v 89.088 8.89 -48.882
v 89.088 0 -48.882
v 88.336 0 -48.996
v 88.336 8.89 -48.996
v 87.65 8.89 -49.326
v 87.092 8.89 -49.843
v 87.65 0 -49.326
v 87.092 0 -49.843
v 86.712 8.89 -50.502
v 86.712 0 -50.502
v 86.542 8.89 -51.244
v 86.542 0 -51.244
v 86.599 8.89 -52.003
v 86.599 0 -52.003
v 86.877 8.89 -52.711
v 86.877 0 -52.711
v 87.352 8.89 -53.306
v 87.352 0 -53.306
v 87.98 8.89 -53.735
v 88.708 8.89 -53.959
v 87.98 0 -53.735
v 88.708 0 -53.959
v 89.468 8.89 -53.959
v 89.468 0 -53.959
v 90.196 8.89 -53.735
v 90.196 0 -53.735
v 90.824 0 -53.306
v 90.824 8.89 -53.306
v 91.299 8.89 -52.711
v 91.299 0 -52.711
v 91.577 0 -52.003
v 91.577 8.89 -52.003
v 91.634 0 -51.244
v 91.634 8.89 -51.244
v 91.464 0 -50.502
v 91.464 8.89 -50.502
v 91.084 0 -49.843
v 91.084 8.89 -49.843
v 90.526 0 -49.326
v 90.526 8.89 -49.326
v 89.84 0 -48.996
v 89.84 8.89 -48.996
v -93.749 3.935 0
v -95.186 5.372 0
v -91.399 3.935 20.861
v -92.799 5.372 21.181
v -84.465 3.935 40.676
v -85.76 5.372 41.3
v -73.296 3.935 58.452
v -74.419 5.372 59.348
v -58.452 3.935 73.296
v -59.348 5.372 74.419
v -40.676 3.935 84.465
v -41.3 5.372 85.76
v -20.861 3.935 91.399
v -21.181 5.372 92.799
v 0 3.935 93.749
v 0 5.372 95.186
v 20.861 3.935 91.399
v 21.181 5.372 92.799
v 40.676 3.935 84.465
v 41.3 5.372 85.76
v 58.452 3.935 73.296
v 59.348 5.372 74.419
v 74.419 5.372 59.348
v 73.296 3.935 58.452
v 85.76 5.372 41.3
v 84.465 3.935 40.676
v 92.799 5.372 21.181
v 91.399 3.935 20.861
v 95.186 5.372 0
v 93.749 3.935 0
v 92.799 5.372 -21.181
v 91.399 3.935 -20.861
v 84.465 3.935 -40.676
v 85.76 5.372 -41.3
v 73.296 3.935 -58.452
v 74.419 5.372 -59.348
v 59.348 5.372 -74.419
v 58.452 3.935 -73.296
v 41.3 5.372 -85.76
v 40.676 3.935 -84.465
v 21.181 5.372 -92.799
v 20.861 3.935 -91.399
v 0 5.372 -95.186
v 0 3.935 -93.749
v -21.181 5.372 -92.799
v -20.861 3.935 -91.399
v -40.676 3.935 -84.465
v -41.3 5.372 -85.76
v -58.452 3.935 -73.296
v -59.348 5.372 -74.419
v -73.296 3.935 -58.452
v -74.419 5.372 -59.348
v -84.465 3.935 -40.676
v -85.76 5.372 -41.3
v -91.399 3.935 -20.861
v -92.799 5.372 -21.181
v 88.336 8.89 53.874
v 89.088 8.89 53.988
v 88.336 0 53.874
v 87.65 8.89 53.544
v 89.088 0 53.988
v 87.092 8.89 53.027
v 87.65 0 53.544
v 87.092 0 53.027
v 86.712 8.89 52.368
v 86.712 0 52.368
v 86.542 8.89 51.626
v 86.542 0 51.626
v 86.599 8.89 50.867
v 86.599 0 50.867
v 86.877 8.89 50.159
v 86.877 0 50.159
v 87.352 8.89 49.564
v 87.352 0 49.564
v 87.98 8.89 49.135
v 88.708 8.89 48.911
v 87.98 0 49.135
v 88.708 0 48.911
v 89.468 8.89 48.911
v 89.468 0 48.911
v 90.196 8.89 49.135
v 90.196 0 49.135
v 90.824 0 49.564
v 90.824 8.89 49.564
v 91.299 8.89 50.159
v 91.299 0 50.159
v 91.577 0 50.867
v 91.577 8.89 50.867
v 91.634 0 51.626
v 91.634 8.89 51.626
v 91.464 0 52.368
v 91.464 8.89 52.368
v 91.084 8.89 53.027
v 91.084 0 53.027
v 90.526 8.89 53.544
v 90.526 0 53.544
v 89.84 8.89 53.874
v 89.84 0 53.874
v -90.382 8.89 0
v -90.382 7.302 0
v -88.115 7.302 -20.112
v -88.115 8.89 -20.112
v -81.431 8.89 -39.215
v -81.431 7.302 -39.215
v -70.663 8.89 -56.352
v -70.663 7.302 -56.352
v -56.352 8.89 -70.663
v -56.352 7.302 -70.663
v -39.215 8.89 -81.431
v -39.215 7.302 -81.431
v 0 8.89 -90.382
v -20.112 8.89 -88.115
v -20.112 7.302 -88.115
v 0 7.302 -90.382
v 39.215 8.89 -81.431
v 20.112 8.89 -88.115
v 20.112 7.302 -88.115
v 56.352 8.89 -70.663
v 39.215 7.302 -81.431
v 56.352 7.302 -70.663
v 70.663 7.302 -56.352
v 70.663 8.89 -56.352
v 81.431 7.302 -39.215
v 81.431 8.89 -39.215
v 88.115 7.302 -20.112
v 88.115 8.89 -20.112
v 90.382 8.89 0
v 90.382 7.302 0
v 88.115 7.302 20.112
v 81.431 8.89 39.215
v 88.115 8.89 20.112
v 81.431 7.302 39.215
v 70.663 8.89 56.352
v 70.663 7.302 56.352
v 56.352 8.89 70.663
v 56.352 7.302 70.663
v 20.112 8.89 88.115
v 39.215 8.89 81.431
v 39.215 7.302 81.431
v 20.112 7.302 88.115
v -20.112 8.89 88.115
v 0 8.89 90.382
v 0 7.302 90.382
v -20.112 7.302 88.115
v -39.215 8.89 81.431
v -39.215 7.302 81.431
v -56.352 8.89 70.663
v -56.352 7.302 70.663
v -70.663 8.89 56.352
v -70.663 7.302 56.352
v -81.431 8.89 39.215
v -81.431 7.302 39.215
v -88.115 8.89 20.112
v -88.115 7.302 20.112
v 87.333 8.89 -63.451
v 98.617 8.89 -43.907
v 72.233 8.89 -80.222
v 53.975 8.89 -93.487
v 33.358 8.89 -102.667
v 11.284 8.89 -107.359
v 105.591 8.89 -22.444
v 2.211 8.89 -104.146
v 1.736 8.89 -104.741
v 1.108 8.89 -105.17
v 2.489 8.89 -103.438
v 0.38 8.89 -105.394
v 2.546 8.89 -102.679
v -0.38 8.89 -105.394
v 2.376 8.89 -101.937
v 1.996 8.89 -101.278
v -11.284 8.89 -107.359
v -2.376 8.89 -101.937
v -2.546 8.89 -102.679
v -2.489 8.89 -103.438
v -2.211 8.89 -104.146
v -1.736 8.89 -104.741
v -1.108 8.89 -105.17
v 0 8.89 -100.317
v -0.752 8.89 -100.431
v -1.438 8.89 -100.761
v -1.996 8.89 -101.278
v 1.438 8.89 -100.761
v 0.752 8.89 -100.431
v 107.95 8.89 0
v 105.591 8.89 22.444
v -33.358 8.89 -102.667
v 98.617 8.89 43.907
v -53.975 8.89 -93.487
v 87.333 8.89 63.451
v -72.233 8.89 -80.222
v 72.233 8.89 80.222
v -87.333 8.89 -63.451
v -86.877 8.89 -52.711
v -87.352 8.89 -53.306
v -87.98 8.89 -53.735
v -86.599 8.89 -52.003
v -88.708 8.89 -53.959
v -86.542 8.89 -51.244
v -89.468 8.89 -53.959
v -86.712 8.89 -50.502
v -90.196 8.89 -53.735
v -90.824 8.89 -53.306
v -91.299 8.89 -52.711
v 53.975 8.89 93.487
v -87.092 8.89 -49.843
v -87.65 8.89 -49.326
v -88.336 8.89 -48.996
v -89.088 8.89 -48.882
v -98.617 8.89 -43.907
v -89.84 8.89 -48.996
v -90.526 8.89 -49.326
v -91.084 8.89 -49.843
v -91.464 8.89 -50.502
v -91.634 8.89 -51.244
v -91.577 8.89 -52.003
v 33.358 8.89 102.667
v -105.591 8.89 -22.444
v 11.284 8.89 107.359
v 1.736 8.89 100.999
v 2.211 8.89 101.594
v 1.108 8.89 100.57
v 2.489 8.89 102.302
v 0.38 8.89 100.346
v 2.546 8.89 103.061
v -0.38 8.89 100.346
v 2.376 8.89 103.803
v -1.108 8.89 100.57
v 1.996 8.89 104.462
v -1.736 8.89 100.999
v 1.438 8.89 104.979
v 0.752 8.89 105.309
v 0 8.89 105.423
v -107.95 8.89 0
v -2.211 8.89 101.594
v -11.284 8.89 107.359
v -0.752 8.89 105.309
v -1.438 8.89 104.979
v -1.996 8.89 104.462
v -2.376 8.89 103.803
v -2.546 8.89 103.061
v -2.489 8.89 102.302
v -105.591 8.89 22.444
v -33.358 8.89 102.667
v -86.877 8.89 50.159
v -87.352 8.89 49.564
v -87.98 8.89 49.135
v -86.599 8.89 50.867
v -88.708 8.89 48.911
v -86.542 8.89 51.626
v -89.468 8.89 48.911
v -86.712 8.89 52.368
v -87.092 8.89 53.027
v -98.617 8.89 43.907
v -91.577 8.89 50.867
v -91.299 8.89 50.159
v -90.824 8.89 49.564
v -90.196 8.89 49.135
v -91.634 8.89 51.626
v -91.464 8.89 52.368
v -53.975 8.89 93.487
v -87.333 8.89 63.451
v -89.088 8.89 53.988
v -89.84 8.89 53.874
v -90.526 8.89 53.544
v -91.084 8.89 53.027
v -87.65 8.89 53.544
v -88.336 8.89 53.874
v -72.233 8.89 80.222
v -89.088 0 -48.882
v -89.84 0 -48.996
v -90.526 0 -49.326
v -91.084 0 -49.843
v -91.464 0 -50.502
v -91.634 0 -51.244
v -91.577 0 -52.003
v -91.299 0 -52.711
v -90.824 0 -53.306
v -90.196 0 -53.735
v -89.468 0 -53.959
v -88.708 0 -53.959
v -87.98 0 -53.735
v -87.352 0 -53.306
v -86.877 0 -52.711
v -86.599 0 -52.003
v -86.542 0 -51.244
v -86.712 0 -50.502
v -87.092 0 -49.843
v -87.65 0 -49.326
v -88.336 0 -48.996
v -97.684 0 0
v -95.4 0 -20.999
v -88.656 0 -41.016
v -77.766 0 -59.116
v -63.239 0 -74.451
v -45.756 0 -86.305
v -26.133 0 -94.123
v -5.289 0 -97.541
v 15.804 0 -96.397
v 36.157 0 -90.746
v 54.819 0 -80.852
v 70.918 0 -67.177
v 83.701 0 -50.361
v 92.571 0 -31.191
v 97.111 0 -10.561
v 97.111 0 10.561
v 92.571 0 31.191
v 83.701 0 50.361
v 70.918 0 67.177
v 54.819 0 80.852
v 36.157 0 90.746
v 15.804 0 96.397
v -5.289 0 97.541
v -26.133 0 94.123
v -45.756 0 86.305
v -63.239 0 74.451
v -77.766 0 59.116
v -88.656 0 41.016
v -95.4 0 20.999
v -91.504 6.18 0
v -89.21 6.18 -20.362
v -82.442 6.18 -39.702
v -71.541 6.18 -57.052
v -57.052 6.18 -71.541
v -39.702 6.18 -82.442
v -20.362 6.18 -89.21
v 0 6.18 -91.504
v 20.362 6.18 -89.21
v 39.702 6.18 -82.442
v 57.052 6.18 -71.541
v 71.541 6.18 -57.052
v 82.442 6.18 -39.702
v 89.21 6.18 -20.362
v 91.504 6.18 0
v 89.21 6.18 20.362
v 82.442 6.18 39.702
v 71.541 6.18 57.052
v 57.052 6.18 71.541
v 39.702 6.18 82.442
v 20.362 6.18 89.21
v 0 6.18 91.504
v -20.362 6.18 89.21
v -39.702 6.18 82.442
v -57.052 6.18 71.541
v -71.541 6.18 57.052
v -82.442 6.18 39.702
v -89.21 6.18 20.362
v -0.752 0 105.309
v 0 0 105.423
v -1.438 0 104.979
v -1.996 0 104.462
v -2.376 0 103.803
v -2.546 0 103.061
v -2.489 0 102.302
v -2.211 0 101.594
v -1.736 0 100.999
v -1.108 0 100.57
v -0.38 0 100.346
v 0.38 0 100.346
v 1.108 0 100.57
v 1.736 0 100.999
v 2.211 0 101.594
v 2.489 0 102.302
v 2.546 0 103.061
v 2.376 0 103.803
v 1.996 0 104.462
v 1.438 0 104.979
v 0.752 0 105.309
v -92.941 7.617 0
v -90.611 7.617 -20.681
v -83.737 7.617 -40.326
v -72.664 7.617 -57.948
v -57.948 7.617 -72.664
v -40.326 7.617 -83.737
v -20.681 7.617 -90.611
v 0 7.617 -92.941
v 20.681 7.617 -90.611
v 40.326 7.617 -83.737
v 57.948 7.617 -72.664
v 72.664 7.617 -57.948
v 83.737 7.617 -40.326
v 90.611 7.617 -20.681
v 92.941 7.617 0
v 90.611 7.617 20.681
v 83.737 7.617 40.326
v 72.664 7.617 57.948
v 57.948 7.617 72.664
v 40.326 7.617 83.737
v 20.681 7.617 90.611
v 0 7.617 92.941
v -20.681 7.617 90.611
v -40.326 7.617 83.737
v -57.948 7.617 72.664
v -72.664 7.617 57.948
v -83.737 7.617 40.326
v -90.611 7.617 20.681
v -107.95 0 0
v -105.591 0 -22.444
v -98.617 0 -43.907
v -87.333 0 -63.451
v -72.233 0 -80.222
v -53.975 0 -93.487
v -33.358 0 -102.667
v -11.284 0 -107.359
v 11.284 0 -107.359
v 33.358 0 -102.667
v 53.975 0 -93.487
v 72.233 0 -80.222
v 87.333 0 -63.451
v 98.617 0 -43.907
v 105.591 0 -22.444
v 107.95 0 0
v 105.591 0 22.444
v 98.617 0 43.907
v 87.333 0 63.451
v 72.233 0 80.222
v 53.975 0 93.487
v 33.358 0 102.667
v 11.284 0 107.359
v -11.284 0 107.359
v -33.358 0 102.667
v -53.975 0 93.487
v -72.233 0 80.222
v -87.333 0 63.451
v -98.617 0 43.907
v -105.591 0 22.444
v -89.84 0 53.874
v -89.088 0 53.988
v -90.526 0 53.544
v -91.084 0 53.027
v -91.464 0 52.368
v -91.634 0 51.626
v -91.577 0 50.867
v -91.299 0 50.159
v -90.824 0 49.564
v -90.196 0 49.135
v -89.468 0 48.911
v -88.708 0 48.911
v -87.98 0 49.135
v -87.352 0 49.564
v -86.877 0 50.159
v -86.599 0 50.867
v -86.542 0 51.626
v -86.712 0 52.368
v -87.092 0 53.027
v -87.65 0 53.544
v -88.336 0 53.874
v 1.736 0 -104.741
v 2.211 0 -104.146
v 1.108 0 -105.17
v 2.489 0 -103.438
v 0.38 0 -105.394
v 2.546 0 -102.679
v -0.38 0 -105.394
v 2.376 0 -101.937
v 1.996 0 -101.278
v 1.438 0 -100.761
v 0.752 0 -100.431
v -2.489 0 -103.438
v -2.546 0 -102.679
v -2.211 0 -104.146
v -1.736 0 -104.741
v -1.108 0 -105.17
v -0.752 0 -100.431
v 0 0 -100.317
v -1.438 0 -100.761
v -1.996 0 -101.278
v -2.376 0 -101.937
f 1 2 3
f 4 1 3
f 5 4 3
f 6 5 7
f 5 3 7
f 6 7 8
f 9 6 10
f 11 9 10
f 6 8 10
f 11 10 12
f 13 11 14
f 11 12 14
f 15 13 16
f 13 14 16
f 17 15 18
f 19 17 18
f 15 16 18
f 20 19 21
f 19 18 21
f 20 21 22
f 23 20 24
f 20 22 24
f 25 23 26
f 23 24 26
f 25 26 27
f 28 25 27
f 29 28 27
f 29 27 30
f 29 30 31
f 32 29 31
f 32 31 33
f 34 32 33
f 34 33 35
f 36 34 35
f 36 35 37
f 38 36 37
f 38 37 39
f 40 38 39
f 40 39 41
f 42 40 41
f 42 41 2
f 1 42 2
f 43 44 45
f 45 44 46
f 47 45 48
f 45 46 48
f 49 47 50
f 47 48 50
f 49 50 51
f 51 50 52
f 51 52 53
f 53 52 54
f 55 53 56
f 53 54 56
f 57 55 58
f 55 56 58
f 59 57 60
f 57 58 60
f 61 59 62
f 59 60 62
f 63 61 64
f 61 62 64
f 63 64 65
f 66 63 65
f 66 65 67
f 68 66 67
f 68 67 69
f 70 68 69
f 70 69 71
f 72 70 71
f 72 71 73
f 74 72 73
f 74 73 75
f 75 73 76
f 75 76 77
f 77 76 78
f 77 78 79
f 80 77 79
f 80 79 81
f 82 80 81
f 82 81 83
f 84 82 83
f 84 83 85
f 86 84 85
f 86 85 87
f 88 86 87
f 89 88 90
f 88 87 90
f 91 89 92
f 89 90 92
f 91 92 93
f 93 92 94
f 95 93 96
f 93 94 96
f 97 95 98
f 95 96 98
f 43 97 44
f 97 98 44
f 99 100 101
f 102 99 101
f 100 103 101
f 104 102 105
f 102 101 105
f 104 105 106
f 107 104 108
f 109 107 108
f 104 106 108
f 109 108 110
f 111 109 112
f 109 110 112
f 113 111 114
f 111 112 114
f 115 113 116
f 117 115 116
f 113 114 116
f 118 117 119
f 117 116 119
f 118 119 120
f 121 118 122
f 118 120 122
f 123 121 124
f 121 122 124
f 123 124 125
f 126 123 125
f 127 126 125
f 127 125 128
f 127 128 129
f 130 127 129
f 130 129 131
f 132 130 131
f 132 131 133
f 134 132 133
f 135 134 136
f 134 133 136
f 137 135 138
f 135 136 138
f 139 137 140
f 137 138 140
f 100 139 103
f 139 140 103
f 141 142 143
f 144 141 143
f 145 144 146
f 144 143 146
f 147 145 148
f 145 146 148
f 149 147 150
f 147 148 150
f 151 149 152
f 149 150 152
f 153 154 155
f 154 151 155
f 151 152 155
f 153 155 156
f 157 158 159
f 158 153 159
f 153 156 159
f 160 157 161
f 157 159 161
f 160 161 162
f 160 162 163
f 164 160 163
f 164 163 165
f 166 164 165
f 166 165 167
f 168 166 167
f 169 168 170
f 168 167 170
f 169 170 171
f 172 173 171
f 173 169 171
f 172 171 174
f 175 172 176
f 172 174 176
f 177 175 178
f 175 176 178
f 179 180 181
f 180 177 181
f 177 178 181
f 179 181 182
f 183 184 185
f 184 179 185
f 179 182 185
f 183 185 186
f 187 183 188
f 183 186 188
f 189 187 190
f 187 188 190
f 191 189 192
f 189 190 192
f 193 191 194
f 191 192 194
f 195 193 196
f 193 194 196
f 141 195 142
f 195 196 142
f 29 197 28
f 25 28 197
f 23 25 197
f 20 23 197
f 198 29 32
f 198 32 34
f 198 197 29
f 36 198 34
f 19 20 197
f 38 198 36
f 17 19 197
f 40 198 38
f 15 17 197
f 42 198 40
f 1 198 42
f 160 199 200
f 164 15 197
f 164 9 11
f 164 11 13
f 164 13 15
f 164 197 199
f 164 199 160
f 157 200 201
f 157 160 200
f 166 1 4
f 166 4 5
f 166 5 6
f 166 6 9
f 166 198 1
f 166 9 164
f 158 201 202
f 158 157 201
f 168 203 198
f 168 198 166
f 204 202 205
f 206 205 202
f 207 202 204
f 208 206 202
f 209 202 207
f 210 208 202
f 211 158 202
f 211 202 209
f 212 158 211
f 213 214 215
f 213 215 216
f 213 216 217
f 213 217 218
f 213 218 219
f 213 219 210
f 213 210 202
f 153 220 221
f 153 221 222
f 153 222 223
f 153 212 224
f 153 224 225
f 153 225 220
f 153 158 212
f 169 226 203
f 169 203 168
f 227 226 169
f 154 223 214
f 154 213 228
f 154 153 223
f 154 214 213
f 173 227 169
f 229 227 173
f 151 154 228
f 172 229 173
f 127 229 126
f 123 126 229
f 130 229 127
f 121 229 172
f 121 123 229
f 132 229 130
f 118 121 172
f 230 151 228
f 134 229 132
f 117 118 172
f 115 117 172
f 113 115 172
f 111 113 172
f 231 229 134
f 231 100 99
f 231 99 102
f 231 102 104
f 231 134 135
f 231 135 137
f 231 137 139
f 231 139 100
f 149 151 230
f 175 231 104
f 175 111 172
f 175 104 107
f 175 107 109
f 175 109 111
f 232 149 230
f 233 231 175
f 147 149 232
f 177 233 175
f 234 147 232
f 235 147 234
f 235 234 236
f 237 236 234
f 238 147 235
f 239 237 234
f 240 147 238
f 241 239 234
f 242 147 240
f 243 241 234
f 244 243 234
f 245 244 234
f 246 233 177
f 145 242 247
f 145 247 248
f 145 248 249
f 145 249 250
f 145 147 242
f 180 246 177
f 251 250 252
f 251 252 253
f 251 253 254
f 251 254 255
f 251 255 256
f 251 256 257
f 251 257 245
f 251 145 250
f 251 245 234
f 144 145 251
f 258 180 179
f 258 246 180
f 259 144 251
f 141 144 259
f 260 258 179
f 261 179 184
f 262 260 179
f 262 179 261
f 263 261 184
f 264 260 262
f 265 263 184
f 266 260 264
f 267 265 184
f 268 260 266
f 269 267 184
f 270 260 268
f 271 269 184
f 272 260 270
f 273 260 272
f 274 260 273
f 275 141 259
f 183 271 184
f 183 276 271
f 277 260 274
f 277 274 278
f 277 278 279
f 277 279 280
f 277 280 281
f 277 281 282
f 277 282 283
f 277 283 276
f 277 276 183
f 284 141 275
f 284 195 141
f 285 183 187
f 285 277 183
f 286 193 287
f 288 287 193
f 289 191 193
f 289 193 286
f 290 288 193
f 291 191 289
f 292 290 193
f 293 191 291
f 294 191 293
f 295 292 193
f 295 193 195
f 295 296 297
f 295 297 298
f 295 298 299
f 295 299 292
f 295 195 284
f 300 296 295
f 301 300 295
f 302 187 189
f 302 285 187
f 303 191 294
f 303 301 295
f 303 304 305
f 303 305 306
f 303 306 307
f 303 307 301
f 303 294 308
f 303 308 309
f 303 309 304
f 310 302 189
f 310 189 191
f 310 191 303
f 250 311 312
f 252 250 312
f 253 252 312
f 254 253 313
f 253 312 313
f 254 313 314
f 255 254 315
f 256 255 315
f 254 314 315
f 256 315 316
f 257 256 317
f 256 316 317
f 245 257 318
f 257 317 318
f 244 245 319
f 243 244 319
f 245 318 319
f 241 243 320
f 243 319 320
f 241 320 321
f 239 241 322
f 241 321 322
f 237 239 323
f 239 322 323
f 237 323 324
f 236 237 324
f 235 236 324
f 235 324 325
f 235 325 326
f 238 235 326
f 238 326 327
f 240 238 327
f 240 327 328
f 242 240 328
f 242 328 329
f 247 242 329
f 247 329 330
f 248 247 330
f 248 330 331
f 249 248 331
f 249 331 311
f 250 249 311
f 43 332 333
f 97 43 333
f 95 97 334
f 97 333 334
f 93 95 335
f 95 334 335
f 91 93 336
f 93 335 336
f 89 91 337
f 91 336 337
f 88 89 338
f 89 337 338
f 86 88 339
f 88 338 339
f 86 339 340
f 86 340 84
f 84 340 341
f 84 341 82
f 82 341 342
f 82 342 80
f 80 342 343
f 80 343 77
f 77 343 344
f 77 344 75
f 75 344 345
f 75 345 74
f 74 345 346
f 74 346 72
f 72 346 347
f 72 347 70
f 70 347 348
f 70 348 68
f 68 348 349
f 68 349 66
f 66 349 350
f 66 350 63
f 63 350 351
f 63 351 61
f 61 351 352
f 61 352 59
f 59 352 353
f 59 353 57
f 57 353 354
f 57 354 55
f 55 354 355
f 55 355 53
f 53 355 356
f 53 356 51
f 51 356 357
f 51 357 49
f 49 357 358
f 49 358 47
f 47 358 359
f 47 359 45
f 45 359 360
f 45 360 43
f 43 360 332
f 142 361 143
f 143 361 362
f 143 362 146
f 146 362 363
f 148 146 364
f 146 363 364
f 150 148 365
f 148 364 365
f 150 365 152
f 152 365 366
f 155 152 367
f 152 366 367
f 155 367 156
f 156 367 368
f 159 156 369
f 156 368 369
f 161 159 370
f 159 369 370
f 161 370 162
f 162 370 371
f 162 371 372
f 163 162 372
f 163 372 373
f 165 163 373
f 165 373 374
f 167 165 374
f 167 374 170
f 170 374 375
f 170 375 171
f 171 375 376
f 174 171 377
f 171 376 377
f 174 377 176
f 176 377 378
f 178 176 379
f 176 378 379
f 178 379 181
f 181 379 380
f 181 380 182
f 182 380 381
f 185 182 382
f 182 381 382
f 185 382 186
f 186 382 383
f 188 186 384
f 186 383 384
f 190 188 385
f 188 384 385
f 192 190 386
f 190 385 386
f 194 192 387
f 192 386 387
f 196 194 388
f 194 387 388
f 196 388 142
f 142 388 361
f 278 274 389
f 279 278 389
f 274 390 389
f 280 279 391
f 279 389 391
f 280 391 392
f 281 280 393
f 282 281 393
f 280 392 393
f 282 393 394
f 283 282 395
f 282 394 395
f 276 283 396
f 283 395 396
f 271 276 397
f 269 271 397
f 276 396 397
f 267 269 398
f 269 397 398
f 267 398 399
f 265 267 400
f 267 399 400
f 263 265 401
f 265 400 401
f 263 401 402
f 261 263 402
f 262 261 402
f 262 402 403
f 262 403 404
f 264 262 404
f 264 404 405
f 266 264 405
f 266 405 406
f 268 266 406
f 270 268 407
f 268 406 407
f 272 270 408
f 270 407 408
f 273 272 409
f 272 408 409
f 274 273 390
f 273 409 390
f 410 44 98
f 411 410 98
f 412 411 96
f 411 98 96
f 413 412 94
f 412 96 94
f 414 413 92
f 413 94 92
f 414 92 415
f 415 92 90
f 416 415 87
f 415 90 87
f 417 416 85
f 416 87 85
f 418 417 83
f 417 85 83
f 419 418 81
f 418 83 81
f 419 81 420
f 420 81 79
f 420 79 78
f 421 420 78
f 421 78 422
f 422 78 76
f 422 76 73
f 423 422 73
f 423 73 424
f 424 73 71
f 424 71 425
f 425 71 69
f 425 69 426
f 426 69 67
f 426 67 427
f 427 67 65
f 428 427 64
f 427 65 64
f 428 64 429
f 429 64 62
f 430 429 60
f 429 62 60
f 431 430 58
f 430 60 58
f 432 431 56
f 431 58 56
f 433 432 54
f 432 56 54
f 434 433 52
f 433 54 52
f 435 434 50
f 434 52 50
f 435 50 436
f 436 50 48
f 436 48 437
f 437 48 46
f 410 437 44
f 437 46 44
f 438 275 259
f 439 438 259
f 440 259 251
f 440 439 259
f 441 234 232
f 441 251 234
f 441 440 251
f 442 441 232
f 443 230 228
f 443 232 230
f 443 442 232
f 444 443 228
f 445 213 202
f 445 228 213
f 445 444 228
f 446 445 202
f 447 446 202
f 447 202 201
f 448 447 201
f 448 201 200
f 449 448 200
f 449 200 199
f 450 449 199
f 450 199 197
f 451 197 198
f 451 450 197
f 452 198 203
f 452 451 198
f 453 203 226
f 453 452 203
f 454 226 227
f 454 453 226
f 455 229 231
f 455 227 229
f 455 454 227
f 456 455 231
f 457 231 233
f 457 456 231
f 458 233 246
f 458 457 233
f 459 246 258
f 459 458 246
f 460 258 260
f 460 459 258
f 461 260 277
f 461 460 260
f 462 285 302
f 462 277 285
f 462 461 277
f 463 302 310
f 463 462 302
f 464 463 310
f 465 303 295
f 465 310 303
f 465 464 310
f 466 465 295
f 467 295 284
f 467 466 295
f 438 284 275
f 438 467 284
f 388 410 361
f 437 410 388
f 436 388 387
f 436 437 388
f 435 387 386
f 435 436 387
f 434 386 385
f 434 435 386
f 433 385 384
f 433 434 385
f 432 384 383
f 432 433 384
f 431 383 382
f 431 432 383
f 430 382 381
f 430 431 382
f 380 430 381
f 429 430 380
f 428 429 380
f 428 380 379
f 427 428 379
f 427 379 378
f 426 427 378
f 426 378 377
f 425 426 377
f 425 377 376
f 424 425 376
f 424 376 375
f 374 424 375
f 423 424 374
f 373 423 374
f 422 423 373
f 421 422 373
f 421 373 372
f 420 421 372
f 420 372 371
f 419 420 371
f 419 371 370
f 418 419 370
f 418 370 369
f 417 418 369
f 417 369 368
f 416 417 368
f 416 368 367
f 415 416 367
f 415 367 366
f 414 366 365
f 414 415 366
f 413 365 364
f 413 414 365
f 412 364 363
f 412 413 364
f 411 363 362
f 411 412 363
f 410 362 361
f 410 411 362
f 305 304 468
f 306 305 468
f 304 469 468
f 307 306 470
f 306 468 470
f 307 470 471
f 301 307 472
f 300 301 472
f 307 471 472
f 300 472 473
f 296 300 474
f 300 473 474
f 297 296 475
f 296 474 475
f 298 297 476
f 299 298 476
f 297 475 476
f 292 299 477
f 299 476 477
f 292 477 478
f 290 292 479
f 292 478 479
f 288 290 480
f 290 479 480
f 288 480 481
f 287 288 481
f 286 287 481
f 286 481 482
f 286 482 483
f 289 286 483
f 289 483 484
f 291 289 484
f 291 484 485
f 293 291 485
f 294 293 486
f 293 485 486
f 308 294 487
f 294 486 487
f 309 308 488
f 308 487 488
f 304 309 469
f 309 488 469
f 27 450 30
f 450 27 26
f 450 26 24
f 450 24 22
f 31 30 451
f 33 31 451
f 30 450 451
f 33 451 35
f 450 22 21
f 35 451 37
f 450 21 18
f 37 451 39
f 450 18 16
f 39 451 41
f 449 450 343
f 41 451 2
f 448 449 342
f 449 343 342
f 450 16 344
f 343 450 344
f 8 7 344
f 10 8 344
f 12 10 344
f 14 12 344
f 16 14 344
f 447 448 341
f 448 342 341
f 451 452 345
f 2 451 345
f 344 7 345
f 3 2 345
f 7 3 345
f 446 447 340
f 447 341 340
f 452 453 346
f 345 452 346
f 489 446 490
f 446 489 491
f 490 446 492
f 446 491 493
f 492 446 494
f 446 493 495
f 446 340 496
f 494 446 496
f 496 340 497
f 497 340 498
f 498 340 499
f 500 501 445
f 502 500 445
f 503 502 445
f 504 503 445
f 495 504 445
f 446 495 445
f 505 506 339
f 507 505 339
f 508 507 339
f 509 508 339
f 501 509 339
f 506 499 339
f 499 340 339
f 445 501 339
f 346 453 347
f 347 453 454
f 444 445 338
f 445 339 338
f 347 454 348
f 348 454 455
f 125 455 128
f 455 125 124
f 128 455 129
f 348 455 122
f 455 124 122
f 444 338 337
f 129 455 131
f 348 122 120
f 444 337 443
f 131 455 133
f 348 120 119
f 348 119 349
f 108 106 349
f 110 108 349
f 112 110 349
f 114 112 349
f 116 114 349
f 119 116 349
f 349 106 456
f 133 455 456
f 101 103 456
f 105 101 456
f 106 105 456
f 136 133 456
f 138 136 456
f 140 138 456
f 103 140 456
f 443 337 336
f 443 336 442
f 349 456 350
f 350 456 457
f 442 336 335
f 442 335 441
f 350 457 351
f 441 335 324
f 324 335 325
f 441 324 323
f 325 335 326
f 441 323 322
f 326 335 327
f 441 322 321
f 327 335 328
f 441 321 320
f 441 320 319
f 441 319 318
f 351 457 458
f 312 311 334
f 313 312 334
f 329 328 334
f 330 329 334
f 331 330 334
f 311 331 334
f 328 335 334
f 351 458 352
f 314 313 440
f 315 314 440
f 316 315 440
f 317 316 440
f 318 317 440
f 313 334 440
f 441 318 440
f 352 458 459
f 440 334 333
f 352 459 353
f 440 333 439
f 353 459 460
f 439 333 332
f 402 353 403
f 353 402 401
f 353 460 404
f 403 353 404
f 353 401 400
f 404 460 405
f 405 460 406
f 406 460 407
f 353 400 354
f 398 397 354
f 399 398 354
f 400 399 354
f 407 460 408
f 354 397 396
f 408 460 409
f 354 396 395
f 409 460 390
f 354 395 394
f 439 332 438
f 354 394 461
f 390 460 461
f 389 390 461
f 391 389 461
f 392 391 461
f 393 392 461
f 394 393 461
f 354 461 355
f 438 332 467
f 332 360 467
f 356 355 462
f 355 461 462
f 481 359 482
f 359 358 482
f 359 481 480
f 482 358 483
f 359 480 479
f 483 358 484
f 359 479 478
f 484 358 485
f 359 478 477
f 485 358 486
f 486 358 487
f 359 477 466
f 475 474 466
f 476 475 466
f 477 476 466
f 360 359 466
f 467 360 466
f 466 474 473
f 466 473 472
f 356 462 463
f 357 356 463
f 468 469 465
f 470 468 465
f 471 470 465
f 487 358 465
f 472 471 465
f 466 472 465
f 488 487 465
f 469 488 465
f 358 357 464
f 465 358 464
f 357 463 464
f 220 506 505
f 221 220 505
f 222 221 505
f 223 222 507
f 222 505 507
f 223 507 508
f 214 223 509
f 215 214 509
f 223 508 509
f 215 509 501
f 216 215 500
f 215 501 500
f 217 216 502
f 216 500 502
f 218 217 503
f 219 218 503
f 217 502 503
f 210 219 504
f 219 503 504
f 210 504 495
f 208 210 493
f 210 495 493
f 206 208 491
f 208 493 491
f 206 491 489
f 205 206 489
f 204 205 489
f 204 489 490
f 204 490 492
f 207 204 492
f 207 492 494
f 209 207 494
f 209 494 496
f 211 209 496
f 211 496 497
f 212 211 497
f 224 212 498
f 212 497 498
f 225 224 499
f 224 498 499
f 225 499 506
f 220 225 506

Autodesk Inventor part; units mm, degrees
ref_plane "YZ Plane" through (0, 0, 0) normal (1, 0, 0) x (0, 1, 0)
ref_plane "XZ Plane" through (0, 0, 0) normal (0, 1, 0) x (-1, 0, 0)
ref_plane "XY Plane" through (0, 0, 0) normal (0, 0, 1) x (1, 0, 0)
sketch "Sketch1" plane through (0, 0, 0) normal (0, 0, 1) x (1, 0, 0)
  line L0 (0, -12.446) -> (0, 12.446) projected
  line L1 (-129.54, 0) -> (21.59, 0) construction
  line L2 (-107.95, 8.89) -> (-107.95, 0)
  line L3 (-107.95, 8.89) -> (-90.3815, 8.89)
  line L4 (-90.3815, 8.89) -> (-90.3815, 7.3025)
  line L5 (-90.3815, 7.3025) -> (-91.504, 6.18)
  line L6 (-91.504, 6.18) -> (-92.9409, 7.6168)
  line L7 (-92.9409, 7.6168) -> (-95.186, 5.3717)
  line L8 (-95.186, 5.3717) -> (-93.7491, 3.9349)
  line L9 (-93.7491, 3.9349) -> (-97.684, 0)
  line L10 (-97.176, 0) -> (-88.9855, 8.1905) construction
  line L11 (-94.0634, 6.4943) -> (-92.3726, 4.8034) construction
  circle A0 centre (-93.218, 5.6489) radius 1.3081 construction
  line L12 (-107.95, -8.89) -> (-90.3815, -8.89) construction
  line L13 (-90.3815, -8.89) -> (-90.3815, -7.3025) construction
  line L14 (-90.3815, -7.3025) -> (-91.504, -6.18) construction
  line L15 (-91.504, -6.18) -> (-92.9409, -7.6168) construction
  line L16 (-92.9409, -7.6168) -> (-95.186, -5.3717) construction
  line L17 (-95.186, -5.3717) -> (-93.7491, -3.9349) construction
  line L18 (-93.7491, -3.9349) -> (-97.684, 0) construction
  line L19 (-107.95, 0) -> (-97.684, 0)
  line L20 (-107.95, 0) -> (-107.95, -8.89) construction
  point P0 (0, 0)
  dimension "d24" = 1.5875
  dimension "d25" = 2.032
  dimension "d26" = 45
  dimension "d27" = 0.508
  dimension "d28" = 3.175
  dimension "d29" = 2.6162
  dimension "d30" = 186.436
  dimension "d31" = 215.9
  dimension "d32" = 17.78
  dimension "d33" = 1.5875
revolve "Revolution1" add sketch "Sketch1" angle 360 about axis through (0, -10, 0) along (0, 1, 0)
sketch "Sketch2" plane through (0, 8.89, 0) normal (0, 1, 0) x (1, 0, 0)
  point P0 (0, 0)
  point P1 (0, 102.87)
  point P2 (-89.088, 51.435)
  point P3 (-89.088, -51.435)
  point P4 (0, -102.87)
  point P5 (89.088, -51.435)
  point P6 (89.088, 51.435)
  dimension "d36" = 102.87
  dimension "d39" = 360
hole "Hole1" at (0, 8.89, -102.87) at (-89.088, 8.89, -51.435) at (-89.088, 8.89, 51.435) at (0, 8.89, 102.87) at (89.088, 8.89, 51.435) at (89.088, 8.89, -51.435) direction (0, -1, 0) diameter 5.1054 end through all clearance for "Flat Head Machine Screw (82)" size "#10" standard "Ansi Unified Screw Threads"
properties part number "3DPRINT,OUTER-V" material "Nylon 6/6"
